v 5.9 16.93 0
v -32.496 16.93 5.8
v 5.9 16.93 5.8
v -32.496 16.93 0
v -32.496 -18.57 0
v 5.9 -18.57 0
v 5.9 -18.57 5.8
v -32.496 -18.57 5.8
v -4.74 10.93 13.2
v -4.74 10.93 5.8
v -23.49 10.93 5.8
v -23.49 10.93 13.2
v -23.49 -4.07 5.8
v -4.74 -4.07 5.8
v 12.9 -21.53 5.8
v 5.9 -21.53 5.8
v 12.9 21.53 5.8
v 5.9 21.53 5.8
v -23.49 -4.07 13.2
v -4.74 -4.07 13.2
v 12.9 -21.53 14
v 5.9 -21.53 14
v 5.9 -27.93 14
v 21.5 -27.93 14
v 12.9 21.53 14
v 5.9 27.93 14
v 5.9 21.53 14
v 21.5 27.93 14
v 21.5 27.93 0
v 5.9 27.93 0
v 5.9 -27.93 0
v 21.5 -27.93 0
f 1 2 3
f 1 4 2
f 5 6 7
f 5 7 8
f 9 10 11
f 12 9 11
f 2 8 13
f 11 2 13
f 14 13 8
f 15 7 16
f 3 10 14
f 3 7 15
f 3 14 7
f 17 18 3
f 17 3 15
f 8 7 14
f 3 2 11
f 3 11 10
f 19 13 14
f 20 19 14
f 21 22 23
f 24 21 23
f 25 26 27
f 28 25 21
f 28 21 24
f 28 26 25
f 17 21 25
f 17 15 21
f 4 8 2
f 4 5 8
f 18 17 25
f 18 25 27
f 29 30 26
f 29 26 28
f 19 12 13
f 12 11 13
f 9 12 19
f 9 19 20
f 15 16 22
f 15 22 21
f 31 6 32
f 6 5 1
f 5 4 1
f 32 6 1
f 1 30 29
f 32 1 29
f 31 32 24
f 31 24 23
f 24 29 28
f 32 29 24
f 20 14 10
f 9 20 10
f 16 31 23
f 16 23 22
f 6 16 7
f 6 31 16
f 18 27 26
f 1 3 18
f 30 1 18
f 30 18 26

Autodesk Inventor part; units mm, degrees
ref_plane "YZ Plane" through (0, 0, 0) normal (1, 0, 0) x (0, 1, 0)
ref_plane "XZ Plane" through (0, 0, 0) normal (0, 1, 0) x (-1, 0, 0)
ref_plane "XY Plane" through (0, 0, 0) normal (0, 0, 1) x (1, 0, 0)
sketch "Sketch8" plane through (0, 0, 0) normal (0, 0, 1) x (1, 0, 0)
  line L0 (-23.4899, -4.07) -> (-4.7399, -4.07)
  line L1 (-4.7399, -4.07) -> (-4.7399, 10.93)
  line L2 (-4.7399, 10.93) -> (-23.4899, 10.93)
  line L3 (-23.4899, 10.93) -> (-23.4899, -4.07)
  line L4 (5.9, -21.53) -> (12.9, -21.53)
  line L5 (12.9, -21.53) -> (12.9, 21.53)
  line L6 (12.9, 21.53) -> (5.9, 21.53)
  line L7 (9.6, -27.93) -> (13.2, -27.93)
  line L8 (-21.4963, 16.93) -> (5.9, 16.93)
  line L9 (5.9, 16.93) -> (5.9, 27.93)
  line L10 (5.9, 27.93) -> (21.5, 27.93)
  line L11 (21.5, 27.93) -> (21.5, -27.93)
  line L12 (21.5, -27.93) -> (5.9, -27.93)
  line L13 (5.9, -27.93) -> (5.9, -18.57)
  line L14 (5.9, -18.57) -> (-21.4789, -18.57)
  line L15 (-21.4789, -18.57) -> (-32.4963, -18.57)
  line L16 (-32.4963, -18.57) -> (-32.4963, 16.93)
  line L17 (-32.4963, 16.93) -> (-21.4963, 16.93)
  point P0 (0, 0)
  point P1 (5.9, -27.93)
extrude "Extrusion10" add sketch "Sketch8" along normal blind 14 contours L4 L5 L6 L9 L10 L11 L12 L7 L13
extrude "Extrusion11" add sketch "Sketch8" along normal blind 13.2 contours L3 L2 L1 L0
extrude "Extrusion12" add sketch "Sketch8" along normal blind 5.8 contours L13 L14 L15 L16 L17 L8 L9 L6 L5 L4
properties part number "heatsink_2"
